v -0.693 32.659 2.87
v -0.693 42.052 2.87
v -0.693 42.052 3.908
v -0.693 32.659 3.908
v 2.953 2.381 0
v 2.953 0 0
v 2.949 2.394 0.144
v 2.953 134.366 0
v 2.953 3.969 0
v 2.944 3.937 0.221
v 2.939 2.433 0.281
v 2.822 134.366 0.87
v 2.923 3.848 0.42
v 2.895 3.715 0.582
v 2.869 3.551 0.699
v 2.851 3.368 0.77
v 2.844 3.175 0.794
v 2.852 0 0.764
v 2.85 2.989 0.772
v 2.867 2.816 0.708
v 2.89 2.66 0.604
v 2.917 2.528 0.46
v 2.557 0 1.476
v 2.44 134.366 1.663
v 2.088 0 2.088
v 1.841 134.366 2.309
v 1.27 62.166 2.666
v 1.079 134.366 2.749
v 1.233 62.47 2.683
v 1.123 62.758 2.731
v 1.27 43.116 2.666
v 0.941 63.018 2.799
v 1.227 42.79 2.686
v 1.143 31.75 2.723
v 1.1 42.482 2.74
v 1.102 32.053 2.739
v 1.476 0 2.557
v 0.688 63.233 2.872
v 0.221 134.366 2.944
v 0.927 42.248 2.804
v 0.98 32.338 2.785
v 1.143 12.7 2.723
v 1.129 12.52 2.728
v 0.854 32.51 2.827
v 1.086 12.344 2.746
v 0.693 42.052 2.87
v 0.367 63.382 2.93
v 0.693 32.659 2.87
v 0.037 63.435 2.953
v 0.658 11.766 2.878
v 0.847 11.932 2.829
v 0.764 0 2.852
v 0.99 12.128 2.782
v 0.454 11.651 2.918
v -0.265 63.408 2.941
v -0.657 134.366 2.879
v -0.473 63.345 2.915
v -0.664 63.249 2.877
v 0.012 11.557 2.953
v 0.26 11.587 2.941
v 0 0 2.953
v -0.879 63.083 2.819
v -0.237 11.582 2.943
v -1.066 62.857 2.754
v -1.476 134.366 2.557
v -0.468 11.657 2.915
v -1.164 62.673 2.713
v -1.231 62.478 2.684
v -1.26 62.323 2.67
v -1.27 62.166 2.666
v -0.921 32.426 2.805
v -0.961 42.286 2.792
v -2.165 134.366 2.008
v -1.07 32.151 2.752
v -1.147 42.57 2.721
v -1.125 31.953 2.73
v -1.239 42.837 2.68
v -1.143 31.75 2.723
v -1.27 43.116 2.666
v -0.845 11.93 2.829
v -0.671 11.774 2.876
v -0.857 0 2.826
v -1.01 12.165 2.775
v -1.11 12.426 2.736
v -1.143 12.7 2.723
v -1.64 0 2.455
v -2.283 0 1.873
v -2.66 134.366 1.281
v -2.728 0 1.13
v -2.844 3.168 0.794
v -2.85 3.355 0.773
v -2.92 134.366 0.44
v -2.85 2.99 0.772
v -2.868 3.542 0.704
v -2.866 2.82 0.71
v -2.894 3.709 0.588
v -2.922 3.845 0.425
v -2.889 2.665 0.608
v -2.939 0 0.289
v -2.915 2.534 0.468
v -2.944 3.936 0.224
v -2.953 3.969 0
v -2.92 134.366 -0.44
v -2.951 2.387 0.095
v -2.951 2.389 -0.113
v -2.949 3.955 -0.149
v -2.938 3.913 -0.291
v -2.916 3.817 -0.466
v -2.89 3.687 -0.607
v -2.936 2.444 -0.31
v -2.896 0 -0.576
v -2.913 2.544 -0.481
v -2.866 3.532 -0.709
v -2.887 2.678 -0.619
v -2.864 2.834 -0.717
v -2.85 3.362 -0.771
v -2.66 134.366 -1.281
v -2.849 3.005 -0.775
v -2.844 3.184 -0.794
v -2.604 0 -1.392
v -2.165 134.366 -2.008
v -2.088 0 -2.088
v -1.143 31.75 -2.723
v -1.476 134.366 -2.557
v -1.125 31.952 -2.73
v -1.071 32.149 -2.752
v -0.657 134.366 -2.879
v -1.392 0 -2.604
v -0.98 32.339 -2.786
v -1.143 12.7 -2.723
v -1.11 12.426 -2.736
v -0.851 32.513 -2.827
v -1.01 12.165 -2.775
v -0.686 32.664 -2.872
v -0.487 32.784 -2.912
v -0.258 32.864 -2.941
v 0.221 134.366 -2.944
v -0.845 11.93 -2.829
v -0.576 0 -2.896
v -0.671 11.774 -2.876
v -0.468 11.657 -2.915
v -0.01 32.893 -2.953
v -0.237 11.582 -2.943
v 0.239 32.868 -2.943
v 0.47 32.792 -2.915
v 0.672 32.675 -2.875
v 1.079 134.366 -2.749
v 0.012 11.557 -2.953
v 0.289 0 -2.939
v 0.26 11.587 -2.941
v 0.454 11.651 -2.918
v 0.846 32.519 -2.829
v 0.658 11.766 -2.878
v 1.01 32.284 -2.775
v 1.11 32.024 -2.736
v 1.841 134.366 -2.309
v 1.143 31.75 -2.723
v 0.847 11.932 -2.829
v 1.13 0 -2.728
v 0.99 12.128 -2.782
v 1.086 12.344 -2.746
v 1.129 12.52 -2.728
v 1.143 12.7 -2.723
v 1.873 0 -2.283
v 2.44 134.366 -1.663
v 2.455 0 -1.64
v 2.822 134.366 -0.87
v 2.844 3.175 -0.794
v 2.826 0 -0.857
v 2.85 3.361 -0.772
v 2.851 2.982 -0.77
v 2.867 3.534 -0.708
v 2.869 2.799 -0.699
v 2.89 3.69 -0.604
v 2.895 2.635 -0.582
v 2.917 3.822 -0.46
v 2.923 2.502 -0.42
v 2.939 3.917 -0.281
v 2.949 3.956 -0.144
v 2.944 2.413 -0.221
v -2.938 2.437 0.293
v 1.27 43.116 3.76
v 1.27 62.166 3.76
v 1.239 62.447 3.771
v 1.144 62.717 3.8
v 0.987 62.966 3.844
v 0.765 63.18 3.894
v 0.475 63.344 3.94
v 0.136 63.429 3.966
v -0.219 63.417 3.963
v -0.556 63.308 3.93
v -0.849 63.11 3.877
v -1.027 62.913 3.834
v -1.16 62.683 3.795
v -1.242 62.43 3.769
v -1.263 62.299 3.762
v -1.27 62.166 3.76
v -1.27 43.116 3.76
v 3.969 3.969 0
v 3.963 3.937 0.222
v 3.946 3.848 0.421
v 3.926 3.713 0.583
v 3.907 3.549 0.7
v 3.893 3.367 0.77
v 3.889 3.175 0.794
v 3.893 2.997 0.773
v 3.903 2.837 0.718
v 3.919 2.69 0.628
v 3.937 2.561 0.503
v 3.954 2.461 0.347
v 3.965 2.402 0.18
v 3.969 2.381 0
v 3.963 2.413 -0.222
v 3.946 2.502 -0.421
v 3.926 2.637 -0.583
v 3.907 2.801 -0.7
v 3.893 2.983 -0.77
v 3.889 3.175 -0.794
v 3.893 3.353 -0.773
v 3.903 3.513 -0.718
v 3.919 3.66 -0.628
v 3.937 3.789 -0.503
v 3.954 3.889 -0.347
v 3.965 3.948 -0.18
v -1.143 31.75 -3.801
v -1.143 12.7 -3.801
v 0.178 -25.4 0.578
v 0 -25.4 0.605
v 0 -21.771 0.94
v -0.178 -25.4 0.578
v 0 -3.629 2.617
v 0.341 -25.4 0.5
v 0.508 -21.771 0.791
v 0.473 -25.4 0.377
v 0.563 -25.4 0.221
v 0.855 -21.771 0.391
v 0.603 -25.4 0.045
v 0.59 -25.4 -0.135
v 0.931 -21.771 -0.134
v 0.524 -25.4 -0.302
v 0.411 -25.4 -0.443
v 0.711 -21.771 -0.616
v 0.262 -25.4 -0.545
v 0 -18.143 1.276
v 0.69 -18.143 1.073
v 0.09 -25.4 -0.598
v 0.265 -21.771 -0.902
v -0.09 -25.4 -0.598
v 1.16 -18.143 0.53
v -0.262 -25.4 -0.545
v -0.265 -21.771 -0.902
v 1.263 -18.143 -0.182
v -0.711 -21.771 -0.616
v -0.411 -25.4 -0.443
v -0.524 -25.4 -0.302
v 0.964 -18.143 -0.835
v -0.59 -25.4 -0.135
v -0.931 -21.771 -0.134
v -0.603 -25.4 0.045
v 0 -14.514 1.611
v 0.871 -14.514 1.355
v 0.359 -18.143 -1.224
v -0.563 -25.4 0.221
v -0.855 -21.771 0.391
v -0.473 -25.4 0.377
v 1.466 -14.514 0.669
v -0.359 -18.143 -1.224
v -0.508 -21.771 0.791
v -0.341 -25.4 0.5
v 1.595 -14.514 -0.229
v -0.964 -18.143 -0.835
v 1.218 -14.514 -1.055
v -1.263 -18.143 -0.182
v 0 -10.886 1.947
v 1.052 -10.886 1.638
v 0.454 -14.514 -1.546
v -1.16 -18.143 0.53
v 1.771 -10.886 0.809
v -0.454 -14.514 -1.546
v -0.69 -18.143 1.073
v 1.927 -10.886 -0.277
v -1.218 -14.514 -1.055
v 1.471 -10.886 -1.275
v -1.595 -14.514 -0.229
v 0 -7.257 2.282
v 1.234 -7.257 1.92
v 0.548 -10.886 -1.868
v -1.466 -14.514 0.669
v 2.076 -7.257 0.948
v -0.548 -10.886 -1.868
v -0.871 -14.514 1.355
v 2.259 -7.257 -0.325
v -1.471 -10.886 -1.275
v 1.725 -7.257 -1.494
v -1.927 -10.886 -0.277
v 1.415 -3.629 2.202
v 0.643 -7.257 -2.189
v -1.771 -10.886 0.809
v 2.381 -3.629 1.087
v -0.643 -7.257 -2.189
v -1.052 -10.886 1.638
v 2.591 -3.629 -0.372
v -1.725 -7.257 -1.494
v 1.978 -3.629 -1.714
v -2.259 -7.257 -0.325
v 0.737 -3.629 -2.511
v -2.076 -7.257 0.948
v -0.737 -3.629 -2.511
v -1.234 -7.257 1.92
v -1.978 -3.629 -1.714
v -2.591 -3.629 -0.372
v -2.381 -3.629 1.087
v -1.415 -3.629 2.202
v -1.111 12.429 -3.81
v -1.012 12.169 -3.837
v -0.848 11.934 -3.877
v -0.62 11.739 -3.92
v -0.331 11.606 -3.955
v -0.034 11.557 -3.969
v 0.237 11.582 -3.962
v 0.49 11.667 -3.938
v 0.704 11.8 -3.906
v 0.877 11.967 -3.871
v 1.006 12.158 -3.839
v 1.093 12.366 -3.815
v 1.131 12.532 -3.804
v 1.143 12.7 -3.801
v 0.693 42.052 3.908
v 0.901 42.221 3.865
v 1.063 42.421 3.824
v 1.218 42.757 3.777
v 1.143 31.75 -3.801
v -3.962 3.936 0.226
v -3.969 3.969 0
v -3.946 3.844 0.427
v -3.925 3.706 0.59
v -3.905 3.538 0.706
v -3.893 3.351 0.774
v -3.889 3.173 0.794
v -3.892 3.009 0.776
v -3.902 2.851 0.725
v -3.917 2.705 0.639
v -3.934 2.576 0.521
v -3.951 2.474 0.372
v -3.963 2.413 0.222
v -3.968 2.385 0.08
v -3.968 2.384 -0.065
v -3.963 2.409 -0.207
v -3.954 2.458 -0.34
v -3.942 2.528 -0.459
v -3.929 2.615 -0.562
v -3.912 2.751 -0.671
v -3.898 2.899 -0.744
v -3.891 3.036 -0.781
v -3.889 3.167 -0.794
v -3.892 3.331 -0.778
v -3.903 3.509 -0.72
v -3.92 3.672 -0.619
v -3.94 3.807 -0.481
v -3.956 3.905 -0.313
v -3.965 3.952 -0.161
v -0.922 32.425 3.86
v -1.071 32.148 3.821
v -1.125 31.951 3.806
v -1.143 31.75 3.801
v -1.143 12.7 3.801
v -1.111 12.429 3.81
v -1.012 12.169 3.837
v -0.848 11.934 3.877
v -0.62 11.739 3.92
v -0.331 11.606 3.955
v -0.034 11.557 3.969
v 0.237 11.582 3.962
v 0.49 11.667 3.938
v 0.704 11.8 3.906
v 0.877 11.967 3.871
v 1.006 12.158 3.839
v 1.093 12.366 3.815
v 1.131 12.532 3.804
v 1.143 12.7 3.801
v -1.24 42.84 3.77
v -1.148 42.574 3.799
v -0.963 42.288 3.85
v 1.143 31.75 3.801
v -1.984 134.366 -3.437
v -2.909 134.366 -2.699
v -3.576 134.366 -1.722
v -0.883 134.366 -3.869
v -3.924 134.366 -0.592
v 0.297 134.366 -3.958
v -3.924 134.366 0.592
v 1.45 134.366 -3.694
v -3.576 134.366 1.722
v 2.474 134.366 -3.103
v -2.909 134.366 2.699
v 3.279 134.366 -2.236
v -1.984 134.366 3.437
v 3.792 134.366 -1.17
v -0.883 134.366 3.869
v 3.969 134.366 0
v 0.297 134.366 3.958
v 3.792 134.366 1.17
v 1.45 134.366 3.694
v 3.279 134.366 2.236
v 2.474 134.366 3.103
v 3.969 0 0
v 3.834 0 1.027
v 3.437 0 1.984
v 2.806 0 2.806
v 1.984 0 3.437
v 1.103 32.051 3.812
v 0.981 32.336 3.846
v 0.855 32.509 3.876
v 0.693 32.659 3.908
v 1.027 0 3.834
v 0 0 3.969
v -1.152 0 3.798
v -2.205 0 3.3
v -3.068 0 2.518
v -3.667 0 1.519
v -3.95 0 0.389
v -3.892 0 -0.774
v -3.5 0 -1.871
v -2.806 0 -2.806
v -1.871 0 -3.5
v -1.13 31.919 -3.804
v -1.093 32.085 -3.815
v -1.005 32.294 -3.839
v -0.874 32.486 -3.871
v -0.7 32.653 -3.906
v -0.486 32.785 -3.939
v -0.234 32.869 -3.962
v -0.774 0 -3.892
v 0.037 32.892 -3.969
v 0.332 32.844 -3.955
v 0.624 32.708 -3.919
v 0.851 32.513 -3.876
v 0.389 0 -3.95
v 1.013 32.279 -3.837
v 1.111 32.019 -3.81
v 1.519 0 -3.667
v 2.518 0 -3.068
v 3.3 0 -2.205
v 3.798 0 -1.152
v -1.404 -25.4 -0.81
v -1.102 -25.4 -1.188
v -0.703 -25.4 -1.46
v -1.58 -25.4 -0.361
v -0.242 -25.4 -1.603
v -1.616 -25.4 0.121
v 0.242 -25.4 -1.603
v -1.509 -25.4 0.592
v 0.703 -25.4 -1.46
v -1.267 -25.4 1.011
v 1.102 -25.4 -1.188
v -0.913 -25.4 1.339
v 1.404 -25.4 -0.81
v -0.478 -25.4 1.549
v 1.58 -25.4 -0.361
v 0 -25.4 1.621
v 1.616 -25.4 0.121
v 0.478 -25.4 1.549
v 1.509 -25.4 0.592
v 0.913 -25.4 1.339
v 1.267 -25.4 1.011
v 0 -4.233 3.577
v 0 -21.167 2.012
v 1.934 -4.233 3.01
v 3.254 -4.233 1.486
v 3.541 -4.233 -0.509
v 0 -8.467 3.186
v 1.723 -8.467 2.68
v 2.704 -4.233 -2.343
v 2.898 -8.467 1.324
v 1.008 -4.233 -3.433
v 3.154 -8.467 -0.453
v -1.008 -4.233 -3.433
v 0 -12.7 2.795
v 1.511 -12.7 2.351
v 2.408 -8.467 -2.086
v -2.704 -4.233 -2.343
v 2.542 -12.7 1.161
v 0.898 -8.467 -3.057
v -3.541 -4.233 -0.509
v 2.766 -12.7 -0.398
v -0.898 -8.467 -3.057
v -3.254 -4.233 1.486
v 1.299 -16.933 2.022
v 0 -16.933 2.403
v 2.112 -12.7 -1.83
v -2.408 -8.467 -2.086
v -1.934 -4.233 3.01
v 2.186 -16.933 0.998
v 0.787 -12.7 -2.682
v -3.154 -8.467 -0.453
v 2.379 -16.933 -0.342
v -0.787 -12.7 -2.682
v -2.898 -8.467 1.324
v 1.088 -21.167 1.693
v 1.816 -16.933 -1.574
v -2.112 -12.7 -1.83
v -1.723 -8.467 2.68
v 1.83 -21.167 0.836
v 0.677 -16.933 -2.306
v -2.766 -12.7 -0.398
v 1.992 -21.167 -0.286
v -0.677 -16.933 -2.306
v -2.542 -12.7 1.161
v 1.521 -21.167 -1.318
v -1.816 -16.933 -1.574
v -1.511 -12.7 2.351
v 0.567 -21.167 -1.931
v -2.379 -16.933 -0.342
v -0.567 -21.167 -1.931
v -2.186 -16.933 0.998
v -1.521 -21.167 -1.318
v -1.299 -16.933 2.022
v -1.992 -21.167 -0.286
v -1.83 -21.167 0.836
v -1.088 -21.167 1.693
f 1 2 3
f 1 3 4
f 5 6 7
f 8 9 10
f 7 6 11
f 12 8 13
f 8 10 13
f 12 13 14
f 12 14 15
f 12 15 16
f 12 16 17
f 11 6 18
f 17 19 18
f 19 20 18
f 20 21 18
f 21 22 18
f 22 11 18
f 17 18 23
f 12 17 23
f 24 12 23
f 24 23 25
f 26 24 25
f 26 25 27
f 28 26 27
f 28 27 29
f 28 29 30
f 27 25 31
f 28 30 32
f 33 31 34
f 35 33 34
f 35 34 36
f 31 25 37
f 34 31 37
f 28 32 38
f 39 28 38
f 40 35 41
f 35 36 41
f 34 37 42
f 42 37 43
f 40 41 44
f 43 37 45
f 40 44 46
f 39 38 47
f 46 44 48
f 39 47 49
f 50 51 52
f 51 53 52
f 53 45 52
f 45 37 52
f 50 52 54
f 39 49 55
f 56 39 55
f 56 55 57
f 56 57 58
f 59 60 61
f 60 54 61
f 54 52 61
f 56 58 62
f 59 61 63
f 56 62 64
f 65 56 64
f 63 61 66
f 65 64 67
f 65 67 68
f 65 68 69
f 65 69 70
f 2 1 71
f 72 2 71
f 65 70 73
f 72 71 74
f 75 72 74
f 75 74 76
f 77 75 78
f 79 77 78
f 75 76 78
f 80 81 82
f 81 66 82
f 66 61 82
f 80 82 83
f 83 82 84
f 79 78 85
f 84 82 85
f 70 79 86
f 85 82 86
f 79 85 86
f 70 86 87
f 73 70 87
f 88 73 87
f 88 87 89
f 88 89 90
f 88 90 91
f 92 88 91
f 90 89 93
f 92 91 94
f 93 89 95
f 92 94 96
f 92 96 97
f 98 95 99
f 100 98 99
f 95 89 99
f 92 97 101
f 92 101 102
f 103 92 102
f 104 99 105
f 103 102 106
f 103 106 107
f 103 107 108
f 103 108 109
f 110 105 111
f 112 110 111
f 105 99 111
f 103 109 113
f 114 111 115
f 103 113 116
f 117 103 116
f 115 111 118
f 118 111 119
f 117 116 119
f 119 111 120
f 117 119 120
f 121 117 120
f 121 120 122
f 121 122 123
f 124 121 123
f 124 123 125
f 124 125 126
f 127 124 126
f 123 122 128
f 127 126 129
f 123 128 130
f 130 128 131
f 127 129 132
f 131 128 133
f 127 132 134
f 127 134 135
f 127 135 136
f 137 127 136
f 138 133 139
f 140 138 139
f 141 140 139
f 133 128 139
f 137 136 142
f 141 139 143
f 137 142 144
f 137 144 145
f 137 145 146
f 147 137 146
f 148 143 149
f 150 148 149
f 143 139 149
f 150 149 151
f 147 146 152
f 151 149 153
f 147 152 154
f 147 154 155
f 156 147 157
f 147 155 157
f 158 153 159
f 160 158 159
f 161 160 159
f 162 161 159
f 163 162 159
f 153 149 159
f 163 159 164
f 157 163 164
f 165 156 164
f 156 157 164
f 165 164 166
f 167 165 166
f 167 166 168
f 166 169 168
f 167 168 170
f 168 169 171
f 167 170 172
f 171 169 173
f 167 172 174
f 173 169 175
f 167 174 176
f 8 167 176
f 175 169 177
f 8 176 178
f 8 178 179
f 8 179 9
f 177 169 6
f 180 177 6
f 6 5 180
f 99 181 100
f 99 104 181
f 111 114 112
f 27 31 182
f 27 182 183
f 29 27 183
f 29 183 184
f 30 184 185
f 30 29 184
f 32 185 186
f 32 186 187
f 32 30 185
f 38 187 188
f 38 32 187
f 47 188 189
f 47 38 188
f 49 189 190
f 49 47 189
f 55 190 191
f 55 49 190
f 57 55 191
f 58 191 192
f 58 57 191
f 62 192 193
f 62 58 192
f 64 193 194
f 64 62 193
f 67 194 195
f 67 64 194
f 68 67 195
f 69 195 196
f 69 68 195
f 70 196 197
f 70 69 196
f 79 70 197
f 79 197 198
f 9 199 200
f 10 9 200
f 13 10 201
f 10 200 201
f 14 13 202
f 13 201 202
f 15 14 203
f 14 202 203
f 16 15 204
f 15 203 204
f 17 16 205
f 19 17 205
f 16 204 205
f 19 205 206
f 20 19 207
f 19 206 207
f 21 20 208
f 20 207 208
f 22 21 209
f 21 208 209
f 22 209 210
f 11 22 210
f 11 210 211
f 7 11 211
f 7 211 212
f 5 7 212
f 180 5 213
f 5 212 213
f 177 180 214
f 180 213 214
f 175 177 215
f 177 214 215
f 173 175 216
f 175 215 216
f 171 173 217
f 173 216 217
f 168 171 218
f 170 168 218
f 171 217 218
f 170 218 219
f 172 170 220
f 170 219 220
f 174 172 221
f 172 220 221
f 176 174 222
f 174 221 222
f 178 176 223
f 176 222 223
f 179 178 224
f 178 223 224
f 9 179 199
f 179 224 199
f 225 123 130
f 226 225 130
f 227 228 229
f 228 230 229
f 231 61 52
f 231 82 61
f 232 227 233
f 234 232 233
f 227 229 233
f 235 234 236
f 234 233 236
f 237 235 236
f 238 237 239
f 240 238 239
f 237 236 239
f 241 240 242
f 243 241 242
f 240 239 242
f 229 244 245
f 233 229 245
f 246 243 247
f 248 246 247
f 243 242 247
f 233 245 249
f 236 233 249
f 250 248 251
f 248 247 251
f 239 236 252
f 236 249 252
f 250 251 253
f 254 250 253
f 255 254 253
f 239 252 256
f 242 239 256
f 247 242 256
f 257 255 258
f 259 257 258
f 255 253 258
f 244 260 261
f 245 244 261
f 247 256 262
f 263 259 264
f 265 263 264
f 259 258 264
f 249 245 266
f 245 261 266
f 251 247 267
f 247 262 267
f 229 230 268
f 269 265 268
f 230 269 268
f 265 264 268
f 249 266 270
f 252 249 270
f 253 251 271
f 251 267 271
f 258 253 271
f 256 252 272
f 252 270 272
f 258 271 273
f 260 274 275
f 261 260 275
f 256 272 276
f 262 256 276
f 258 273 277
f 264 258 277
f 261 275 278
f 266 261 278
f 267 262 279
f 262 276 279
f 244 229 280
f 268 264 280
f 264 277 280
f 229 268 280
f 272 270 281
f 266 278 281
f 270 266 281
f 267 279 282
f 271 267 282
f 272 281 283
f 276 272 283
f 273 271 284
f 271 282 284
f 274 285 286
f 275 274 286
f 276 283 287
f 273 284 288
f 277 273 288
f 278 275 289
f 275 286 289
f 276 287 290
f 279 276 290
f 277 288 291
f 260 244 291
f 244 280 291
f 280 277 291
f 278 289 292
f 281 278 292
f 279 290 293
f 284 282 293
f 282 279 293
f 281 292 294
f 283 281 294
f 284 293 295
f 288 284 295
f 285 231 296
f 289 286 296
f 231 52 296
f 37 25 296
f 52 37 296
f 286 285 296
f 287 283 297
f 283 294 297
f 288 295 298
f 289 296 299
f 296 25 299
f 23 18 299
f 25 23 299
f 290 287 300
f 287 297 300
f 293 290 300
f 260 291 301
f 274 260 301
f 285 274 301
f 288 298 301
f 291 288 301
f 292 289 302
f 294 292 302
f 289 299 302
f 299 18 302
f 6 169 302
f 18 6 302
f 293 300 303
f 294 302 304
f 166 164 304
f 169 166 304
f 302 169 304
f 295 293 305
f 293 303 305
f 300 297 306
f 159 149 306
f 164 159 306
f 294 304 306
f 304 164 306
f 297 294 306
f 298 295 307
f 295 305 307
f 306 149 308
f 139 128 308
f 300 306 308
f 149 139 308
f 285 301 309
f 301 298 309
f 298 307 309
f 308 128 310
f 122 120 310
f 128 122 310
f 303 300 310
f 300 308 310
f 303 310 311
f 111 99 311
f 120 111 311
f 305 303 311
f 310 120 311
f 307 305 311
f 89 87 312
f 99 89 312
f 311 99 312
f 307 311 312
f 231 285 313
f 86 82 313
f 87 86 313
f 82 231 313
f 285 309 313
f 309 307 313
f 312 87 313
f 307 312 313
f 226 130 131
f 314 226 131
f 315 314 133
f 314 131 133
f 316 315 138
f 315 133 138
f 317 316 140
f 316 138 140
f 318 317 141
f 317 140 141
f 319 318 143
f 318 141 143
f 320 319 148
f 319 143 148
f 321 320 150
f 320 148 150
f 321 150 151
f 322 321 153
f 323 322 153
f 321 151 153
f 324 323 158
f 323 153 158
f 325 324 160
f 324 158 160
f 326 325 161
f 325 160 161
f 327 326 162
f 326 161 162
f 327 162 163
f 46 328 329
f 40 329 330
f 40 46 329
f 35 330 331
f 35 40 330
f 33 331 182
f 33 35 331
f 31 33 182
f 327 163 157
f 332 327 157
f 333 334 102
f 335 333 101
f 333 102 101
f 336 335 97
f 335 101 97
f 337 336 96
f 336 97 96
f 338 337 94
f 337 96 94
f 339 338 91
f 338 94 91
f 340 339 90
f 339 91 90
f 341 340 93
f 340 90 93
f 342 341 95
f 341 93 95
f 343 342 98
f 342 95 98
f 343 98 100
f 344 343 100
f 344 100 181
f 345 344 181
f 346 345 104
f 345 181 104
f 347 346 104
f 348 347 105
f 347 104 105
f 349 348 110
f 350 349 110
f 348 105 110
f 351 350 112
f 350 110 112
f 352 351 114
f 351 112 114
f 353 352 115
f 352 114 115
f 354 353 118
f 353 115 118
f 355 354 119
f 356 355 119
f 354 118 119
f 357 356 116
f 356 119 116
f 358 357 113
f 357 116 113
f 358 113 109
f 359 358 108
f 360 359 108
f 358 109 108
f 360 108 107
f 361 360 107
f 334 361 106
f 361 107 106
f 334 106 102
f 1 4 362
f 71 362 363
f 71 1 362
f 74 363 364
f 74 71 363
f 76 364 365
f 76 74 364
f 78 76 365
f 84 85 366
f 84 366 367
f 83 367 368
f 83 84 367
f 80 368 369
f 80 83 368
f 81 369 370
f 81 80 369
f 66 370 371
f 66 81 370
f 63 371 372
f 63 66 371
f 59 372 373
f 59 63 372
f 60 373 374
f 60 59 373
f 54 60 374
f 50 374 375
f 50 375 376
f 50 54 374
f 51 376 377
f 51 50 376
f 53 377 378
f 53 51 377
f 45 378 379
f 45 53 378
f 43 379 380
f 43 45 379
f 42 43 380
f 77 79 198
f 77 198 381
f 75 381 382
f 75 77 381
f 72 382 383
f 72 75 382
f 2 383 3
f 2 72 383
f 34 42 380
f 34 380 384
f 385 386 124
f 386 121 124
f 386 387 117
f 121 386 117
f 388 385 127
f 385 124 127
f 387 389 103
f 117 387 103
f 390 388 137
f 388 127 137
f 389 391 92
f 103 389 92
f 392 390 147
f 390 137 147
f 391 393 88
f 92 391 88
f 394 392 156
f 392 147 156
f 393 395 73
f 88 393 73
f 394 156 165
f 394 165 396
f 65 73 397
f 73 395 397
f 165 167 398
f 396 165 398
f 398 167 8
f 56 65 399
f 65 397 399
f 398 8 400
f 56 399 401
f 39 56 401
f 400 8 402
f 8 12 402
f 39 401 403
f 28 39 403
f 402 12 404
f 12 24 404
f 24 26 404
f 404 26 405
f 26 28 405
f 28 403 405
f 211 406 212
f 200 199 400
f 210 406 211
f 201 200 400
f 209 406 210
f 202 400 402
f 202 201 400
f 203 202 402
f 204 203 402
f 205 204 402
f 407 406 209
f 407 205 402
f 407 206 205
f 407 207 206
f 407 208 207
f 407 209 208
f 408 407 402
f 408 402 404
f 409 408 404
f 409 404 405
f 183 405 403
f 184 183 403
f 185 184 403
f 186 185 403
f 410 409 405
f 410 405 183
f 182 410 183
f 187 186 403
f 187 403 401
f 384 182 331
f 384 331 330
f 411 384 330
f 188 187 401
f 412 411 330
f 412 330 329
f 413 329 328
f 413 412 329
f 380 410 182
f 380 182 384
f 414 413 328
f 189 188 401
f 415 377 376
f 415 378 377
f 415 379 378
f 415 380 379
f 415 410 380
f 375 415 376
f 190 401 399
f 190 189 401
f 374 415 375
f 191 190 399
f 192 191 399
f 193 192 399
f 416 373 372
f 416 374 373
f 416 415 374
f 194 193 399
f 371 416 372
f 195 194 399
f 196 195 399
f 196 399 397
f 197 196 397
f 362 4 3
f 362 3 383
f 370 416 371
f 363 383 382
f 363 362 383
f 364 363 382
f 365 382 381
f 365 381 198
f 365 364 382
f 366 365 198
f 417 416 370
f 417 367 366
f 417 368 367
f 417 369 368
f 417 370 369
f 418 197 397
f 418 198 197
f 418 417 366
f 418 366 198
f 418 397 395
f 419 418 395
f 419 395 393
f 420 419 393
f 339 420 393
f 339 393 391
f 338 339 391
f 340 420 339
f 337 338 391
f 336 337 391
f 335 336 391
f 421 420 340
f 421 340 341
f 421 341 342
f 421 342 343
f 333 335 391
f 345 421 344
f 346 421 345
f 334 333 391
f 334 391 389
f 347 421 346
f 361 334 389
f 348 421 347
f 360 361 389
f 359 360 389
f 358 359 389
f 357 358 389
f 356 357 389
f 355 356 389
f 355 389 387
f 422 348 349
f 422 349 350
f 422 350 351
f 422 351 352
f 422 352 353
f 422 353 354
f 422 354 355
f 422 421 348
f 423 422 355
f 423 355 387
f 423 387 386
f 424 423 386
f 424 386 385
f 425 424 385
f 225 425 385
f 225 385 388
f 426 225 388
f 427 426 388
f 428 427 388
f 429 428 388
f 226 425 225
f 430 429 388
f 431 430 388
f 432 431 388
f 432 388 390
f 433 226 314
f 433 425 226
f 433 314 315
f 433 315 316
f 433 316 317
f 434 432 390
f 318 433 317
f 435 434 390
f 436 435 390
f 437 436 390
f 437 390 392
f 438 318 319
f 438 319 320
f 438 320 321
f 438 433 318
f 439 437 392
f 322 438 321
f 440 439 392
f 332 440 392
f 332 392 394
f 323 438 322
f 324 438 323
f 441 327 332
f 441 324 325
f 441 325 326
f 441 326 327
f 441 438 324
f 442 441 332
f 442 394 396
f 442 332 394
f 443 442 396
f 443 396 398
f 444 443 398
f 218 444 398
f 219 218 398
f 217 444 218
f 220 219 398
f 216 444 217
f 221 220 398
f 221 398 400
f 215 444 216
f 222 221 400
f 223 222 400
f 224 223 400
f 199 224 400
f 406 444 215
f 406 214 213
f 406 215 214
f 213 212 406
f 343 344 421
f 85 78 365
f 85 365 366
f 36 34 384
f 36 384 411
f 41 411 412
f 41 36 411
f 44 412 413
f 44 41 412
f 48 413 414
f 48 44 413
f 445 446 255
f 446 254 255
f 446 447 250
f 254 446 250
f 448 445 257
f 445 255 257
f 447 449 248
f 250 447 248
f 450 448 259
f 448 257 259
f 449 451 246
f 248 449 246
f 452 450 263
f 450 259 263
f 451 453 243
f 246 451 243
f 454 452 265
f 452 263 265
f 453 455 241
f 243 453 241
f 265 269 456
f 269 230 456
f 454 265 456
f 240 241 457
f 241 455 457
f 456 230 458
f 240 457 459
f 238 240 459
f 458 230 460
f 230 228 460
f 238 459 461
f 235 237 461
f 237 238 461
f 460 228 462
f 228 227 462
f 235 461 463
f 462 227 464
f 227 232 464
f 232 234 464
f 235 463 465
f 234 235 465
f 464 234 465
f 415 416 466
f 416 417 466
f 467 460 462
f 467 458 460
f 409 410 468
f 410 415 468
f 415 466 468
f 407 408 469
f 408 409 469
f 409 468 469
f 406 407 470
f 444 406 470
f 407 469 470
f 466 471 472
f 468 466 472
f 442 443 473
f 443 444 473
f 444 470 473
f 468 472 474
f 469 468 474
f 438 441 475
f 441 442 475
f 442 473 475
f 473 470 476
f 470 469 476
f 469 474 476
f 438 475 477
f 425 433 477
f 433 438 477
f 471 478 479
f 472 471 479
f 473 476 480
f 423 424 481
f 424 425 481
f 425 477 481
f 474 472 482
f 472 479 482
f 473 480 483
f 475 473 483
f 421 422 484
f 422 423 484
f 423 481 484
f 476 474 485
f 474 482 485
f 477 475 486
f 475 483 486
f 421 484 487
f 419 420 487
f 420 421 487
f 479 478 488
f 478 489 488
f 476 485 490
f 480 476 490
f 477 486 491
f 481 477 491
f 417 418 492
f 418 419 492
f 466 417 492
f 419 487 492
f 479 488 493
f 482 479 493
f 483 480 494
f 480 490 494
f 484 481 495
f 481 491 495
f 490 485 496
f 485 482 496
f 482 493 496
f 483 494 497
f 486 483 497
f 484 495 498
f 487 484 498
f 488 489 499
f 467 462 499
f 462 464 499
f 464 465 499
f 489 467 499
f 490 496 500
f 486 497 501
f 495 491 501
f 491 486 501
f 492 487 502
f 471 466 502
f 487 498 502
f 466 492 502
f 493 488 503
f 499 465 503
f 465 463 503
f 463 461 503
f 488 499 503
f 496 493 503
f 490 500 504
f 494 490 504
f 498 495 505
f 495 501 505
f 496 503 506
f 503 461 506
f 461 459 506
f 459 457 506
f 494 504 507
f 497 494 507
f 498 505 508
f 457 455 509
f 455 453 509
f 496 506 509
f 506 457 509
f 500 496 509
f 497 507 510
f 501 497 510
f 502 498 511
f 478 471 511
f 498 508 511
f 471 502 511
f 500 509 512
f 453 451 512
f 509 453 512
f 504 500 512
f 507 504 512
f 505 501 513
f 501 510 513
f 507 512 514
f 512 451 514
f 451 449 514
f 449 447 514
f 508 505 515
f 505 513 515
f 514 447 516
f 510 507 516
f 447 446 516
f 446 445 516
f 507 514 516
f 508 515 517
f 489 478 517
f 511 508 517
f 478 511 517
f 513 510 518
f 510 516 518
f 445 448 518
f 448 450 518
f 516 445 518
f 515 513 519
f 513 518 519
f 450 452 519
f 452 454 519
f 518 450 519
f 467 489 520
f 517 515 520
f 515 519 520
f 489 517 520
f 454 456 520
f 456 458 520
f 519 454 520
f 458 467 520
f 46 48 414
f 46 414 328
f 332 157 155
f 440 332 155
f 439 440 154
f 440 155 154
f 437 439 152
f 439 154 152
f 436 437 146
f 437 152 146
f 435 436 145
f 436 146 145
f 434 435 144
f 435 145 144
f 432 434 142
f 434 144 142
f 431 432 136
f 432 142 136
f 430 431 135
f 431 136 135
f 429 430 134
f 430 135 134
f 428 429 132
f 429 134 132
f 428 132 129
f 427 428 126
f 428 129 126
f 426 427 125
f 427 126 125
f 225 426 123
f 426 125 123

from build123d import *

# Parameters (mm, degrees)
F0_R          = 3.96875
F0_R_2        = 2.95275
F1_DEPTH      = 134.366
F3_DEPTH      = 3.96975
F3_DEPTH_BACK = 3.96975
F7_R          = 0.79375
F8_DEPTH      = 12.7
F9_DEPTH      = 3.9697501215


# Not quite as in the source:
# - the program builds the solid bodies; features that only make, move or delete a surface that nothing else refers to are left out


with BuildPart() as f1:
    # F0 (on Front) → F1 (new body)
    with BuildSketch(Plane.XZ):
        Circle(F0_R)
        Circle(F0_R_2, mode=Mode.SUBTRACT)
    extrude(amount=-F1_DEPTH)

    # F2 (on Top) → F3 (cut, two sides)
    with BuildSketch(Plane.XY) as f3_sk:
        with BuildLine():
            ThreePointArc((1.143, 31.75), (0, 32.893), (-1.143, 31.75))
            Line((-1.143, 31.75), (-1.143, 12.7))
            ThreePointArc((-1.143, 12.7), (0, 11.557), (1.143, 12.7))
            Line((1.143, 12.7), (1.143, 31.75))
        make_face()
    extrude(amount=F3_DEPTH, mode=Mode.SUBTRACT)
    extrude(f3_sk.sketch, amount=-F3_DEPTH_BACK, mode=Mode.SUBTRACT)

    # F5 (on Right) → F6 (revolve)
    with BuildSketch(Plane.YZ):
        Polygon((0, 3.96875), (-25.4, 1.6208575107), (-25.4, 0.6048575107), (0, 2.95275), align=None)
    revolve(axis=Axis((0, -12.7, 0), (0, 1, 0)))

    # F7 (on Right) → F8 (cut, symmetric)
    with BuildSketch(Plane.YZ):
        with Locations((3.175, 0)):
            Circle(F7_R)
    extrude(amount=F8_DEPTH, both=True, mode=Mode.SUBTRACT)

    # F4 (on Top) → F9 (cut, through all)
    with BuildSketch(Plane.XY):
        with BuildLine():
            ThreePointArc((1.27, 62.165913868), (0, 63.435913868), (-1.27, 62.165913868))
            Line((-1.27, 62.165913868), (-1.27, 43.115913868))
            ThreePointArc((-1.27, 43.115913868), (-1.1164401975, 42.5105534089), (-0.6928956136, 42.0515851271))
            Line((-0.6928956136, 42.0515851271), (-0.6928956136, 31.9918245077))
            Line((-0.6928956136, 31.9918245077), (0.6928956136, 31.9918245077))
            Line((0.6928956136, 31.9918245077), (0.6928956136, 42.0515851271))
            ThreePointArc((0.6928956136, 42.0515851271), (1.1164401975, 42.5105534089), (1.27, 43.115913868))
            Line((1.27, 43.115913868), (1.27, 62.165913868))
        make_face()
    extrude(amount=F9_DEPTH, mode=Mode.SUBTRACT)


solid = f1.part
